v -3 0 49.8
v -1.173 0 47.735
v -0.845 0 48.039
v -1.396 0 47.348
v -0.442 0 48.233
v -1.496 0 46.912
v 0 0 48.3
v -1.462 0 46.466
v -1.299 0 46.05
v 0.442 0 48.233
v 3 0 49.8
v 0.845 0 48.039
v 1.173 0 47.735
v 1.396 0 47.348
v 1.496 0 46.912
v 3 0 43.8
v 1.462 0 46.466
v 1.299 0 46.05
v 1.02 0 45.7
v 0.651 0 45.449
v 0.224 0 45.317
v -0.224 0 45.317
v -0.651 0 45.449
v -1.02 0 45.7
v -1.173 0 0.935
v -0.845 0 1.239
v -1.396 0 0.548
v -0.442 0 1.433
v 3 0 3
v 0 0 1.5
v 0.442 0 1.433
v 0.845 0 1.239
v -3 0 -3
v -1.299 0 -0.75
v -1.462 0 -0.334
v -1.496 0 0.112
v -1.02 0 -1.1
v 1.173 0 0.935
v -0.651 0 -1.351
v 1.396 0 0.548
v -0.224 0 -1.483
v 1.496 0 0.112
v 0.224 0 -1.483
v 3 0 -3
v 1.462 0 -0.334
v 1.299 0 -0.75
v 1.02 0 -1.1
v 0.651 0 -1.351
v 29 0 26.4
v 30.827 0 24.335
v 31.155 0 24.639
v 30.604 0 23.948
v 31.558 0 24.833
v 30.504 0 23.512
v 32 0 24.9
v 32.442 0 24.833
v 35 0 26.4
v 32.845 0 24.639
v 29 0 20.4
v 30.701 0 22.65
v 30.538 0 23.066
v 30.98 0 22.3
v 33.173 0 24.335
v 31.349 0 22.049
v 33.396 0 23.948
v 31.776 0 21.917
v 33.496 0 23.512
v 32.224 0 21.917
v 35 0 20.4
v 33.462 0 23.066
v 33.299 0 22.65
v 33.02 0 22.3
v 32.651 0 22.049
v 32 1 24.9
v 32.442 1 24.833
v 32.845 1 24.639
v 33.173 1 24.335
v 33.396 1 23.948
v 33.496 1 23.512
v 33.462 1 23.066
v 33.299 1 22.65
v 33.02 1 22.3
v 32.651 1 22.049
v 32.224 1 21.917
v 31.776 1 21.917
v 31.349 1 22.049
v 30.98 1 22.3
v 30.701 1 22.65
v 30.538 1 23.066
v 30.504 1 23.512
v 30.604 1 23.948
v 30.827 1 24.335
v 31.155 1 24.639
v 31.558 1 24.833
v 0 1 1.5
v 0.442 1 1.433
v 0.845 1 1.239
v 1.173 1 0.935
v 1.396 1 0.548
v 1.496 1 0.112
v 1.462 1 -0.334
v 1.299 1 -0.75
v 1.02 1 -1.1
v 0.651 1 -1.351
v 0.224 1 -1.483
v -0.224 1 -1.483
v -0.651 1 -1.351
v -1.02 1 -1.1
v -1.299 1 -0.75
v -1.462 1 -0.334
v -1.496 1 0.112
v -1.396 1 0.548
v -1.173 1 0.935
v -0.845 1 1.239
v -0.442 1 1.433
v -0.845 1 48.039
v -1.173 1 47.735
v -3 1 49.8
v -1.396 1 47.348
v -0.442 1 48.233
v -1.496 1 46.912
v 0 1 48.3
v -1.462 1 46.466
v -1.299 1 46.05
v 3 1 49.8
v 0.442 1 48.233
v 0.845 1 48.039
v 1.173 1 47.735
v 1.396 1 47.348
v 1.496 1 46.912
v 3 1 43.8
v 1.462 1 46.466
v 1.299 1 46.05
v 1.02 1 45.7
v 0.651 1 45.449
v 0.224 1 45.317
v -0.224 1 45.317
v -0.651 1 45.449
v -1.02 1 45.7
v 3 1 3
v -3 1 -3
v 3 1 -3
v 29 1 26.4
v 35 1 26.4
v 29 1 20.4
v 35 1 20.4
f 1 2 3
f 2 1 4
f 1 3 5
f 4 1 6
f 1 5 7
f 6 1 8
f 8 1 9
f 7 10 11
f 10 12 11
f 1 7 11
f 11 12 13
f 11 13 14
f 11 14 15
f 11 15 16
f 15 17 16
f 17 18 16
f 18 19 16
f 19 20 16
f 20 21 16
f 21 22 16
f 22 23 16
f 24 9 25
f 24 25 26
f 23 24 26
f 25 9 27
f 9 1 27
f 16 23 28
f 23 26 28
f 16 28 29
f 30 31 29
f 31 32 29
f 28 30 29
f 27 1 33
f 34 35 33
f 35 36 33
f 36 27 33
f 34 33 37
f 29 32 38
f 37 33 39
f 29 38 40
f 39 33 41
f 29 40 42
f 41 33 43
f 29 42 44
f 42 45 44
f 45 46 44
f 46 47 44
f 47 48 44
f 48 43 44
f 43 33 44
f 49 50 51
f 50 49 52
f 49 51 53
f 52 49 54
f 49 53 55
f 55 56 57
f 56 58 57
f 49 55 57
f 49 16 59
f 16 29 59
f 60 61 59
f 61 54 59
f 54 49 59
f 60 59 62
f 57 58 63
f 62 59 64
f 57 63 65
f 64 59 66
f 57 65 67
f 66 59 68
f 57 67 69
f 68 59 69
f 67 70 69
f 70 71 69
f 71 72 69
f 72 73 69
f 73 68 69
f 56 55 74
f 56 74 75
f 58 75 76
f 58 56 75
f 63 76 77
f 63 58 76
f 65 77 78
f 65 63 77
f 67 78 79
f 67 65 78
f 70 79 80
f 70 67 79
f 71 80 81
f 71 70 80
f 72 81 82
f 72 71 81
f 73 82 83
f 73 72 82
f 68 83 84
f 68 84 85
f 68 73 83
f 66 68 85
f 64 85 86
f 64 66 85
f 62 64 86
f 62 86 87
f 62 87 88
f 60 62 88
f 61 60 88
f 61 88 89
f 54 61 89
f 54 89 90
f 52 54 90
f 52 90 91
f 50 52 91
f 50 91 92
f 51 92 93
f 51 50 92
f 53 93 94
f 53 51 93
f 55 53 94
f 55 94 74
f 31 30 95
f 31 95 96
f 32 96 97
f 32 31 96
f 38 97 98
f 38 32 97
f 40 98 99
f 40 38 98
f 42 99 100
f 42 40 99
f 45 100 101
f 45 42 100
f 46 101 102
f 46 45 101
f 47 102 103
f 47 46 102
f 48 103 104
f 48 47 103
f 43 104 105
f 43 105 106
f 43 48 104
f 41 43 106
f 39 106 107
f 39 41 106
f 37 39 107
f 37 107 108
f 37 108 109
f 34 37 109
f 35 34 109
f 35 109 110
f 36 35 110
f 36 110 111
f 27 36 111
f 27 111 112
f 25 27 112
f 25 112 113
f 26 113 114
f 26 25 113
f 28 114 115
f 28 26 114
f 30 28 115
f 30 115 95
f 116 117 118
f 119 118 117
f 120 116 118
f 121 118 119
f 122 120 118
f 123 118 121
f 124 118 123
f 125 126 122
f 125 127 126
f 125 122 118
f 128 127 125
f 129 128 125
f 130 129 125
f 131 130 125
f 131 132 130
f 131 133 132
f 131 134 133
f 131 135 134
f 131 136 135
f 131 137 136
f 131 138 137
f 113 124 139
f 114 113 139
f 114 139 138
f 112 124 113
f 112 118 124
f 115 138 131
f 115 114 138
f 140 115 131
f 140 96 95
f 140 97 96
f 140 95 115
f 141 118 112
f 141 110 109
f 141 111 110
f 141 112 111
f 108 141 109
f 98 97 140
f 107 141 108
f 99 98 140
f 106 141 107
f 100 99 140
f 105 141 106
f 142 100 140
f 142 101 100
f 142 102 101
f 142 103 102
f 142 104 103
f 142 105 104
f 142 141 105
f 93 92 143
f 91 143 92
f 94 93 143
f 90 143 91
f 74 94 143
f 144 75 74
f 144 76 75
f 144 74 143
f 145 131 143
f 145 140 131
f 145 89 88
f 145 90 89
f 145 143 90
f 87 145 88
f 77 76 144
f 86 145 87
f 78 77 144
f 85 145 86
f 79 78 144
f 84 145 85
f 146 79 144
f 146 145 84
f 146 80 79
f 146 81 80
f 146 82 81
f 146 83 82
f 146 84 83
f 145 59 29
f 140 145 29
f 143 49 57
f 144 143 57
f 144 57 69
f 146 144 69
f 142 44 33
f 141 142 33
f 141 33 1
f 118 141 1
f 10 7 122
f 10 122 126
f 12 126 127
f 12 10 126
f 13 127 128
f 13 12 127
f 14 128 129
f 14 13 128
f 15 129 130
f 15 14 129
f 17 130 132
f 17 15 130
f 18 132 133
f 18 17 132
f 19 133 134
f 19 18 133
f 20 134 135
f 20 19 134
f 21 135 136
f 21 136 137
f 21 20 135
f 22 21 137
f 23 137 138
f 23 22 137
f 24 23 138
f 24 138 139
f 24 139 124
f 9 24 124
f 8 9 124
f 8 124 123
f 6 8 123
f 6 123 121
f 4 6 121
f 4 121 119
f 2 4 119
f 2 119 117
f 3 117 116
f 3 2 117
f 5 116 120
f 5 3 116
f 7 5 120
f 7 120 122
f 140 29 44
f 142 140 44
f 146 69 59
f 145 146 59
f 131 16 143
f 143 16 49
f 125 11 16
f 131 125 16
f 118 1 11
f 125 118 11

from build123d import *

# Parameters (mm, degrees)
CROQUIS1_R              = 1.5
SALIENTE_EXTRUIR1_DEPTH = 1
CORTAR_EXTRUIR1_DEPTH   = 1


with BuildPart() as part:
    # Croquis1 → Saliente-Extruir1 (new body)
    with BuildSketch(Plane(origin=(0, 0, 0), x_dir=(1, 0, 0), z_dir=(0, 1, 0))):
        Polygon((-3, 3), (-3, -49.8), (3, -49.8), (3, -43.8), (29, -26.4), (35, -26.4), (35, -20.4), (29, -20.4), (3, -3), (3, 3), align=None)
        with Locations(Location((0, 0, 0), (0, 0, 270))):
            Circle(CROQUIS1_R, mode=Mode.SUBTRACT)
        with Locations(Location((0, -46.8, 0), (0, 0, 270))):
            Circle(CROQUIS1_R, mode=Mode.SUBTRACT)
        with Locations(Location((32, -23.4, 0), (0, 0, 270))):
            Circle(CROQUIS1_R, mode=Mode.SUBTRACT)
    extrude(amount=SALIENTE_EXTRUIR1_DEPTH)

    # Croquis2 → Cortar-Extruir1 (cut)
    with BuildSketch(Plane(origin=(0, 4, 0), x_dir=(1, 0, 0), z_dir=(0, 1, 0))):
        Polygon((29, -20.4), (29, -26.4), (1.37887203, -65.195749652), (-23.269516781, -18.416533666), (-7.63010581, 16.328115394), align=None)
    extrude(amount=-CORTAR_EXTRUIR1_DEPTH, mode=Mode.SUBTRACT)


solid = part.part
